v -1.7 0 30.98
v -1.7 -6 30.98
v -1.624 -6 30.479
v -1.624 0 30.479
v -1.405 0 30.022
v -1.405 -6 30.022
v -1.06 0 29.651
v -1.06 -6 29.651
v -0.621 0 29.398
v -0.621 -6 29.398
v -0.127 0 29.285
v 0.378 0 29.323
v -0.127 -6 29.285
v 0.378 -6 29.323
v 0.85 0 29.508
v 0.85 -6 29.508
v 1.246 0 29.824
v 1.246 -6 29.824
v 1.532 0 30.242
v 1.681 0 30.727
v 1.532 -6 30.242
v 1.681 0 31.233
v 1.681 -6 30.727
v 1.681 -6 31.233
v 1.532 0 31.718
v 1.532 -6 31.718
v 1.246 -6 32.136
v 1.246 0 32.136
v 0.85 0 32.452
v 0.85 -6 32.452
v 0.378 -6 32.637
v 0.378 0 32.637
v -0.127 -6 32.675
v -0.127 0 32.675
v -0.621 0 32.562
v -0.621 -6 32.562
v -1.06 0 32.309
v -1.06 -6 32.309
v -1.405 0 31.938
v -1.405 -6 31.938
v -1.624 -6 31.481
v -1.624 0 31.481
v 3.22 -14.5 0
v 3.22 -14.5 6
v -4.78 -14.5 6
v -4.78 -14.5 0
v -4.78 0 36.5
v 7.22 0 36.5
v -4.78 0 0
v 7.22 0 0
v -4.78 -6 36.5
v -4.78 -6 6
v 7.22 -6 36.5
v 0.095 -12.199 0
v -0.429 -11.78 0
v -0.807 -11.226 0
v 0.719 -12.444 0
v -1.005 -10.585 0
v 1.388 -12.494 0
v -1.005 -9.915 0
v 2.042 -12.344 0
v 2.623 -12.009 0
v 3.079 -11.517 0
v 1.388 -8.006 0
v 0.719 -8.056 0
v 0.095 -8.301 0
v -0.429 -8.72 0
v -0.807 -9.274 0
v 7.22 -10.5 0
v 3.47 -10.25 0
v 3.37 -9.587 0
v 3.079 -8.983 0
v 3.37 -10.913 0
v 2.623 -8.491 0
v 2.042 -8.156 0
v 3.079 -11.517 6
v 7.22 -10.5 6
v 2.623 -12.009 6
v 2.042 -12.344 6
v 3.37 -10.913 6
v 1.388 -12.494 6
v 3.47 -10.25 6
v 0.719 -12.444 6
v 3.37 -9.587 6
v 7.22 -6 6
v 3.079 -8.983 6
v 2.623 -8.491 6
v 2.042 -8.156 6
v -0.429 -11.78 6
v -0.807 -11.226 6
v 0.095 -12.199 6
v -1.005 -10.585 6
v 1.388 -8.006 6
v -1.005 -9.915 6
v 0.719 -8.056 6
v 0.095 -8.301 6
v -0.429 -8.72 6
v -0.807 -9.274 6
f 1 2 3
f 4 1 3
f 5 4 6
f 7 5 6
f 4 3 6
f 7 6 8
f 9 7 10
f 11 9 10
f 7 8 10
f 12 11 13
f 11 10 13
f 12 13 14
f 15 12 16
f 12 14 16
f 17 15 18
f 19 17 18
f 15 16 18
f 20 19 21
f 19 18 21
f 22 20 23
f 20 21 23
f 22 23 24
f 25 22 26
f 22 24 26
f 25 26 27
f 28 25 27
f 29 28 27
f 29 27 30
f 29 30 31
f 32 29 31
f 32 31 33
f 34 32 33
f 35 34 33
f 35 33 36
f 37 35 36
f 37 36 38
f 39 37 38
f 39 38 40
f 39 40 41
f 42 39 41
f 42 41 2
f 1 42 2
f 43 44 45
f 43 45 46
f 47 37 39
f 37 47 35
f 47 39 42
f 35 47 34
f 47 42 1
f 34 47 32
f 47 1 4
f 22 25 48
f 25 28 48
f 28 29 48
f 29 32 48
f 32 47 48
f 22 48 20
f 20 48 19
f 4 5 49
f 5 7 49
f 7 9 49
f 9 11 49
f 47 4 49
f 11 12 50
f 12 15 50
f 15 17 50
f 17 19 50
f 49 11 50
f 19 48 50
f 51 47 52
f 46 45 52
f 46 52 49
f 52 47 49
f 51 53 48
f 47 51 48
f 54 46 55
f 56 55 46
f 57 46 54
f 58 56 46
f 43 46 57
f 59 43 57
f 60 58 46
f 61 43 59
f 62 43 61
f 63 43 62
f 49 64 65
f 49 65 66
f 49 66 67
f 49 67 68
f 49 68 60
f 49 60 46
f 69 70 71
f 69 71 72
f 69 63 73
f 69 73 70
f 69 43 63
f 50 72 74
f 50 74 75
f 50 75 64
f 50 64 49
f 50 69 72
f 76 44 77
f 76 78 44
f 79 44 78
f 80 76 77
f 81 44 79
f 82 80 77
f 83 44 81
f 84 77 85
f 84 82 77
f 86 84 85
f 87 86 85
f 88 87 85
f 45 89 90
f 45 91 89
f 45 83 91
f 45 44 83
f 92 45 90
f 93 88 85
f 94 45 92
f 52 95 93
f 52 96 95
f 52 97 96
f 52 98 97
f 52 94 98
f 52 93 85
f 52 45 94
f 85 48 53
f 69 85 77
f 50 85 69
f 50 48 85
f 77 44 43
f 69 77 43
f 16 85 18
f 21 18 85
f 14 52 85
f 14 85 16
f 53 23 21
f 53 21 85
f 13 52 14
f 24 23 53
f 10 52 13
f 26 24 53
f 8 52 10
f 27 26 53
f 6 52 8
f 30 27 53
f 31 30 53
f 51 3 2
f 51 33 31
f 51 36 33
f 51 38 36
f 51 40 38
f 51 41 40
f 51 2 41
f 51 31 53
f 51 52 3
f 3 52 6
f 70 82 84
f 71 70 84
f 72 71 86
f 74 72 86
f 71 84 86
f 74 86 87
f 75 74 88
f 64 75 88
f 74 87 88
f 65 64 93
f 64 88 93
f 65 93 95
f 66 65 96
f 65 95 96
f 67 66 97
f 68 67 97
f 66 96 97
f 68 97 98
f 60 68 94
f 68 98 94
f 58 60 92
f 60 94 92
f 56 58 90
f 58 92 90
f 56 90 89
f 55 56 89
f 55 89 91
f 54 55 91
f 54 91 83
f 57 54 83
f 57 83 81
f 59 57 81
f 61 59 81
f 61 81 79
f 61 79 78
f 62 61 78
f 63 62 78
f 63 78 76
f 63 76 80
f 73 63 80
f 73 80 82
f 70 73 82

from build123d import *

# Parameters (mm, degrees)
SKETCH1_W                      = 36.5
SKETCH1_H                      = 14.5
BOSS_EXTRUDE1_DEPTH            = 12
SKETCH2_W                      = 30.5
SKETCH2_H                      = 8.5
CUT_EXTRUDE1_DEPTH             = 42.067018397
F_4_5_4_5_DIAMETER_HOLE1_D     = 4.5
F_4_5_4_5_DIAMETER_HOLE1_DEPTH = 36.5
F_3_4_3_4_DIAMETER_HOLE1_D     = 3.4
F_3_4_3_4_DIAMETER_HOLE1_DEPTH = 14.5
CHAMFER1_SIZE                  = 4


with BuildPart() as part:
    # Sketch1 → Boss-Extrude1 (new body)
    with BuildSketch(Plane(origin=(7.22, 0, 0), x_dir=(0, 0, -1), z_dir=(1, 0, 0))):
        with Locations((-18.25, -7.25)):
            Rectangle(SKETCH1_W, SKETCH1_H)
    extrude(amount=-BOSS_EXTRUDE1_DEPTH)

    # Sketch2 → Cut-Extrude1 (cut, through all)
    with BuildSketch(Plane.ZY.offset(4.78)):
        with Locations((21.25, -10.25)):
            Rectangle(SKETCH2_W, SKETCH2_H)
    extrude(amount=-CUT_EXTRUDE1_DEPTH, mode=Mode.SUBTRACT)

    # Ø4.5 (4.5) Diameter Hole1
    with Locations(Plane(origin=(0, 0, 0), x_dir=(-1, 0, 0), z_dir=(0, 0, -1))):
        with Locations((-1.22, -10.25)):
            Hole(F_4_5_4_5_DIAMETER_HOLE1_D / 2, depth=F_4_5_4_5_DIAMETER_HOLE1_DEPTH)

    # Ø3.4 (3.4) Diameter Hole1
    with Locations(Plane(origin=(0, 0, 0), x_dir=(1, 0, 0), z_dir=(0, 1, 0))):
        with Locations((0, -30.98)):
            Hole(F_3_4_3_4_DIAMETER_HOLE1_D / 2, depth=F_3_4_3_4_DIAMETER_HOLE1_DEPTH)

    # Chamfer1
    chamfer1_edges = [part.edges().sort_by_distance(p)[0] for p in [
        (7.22, -14.5, 3),
    ]]
    chamfer(chamfer1_edges, length=CHAMFER1_SIZE)


solid = part.part
